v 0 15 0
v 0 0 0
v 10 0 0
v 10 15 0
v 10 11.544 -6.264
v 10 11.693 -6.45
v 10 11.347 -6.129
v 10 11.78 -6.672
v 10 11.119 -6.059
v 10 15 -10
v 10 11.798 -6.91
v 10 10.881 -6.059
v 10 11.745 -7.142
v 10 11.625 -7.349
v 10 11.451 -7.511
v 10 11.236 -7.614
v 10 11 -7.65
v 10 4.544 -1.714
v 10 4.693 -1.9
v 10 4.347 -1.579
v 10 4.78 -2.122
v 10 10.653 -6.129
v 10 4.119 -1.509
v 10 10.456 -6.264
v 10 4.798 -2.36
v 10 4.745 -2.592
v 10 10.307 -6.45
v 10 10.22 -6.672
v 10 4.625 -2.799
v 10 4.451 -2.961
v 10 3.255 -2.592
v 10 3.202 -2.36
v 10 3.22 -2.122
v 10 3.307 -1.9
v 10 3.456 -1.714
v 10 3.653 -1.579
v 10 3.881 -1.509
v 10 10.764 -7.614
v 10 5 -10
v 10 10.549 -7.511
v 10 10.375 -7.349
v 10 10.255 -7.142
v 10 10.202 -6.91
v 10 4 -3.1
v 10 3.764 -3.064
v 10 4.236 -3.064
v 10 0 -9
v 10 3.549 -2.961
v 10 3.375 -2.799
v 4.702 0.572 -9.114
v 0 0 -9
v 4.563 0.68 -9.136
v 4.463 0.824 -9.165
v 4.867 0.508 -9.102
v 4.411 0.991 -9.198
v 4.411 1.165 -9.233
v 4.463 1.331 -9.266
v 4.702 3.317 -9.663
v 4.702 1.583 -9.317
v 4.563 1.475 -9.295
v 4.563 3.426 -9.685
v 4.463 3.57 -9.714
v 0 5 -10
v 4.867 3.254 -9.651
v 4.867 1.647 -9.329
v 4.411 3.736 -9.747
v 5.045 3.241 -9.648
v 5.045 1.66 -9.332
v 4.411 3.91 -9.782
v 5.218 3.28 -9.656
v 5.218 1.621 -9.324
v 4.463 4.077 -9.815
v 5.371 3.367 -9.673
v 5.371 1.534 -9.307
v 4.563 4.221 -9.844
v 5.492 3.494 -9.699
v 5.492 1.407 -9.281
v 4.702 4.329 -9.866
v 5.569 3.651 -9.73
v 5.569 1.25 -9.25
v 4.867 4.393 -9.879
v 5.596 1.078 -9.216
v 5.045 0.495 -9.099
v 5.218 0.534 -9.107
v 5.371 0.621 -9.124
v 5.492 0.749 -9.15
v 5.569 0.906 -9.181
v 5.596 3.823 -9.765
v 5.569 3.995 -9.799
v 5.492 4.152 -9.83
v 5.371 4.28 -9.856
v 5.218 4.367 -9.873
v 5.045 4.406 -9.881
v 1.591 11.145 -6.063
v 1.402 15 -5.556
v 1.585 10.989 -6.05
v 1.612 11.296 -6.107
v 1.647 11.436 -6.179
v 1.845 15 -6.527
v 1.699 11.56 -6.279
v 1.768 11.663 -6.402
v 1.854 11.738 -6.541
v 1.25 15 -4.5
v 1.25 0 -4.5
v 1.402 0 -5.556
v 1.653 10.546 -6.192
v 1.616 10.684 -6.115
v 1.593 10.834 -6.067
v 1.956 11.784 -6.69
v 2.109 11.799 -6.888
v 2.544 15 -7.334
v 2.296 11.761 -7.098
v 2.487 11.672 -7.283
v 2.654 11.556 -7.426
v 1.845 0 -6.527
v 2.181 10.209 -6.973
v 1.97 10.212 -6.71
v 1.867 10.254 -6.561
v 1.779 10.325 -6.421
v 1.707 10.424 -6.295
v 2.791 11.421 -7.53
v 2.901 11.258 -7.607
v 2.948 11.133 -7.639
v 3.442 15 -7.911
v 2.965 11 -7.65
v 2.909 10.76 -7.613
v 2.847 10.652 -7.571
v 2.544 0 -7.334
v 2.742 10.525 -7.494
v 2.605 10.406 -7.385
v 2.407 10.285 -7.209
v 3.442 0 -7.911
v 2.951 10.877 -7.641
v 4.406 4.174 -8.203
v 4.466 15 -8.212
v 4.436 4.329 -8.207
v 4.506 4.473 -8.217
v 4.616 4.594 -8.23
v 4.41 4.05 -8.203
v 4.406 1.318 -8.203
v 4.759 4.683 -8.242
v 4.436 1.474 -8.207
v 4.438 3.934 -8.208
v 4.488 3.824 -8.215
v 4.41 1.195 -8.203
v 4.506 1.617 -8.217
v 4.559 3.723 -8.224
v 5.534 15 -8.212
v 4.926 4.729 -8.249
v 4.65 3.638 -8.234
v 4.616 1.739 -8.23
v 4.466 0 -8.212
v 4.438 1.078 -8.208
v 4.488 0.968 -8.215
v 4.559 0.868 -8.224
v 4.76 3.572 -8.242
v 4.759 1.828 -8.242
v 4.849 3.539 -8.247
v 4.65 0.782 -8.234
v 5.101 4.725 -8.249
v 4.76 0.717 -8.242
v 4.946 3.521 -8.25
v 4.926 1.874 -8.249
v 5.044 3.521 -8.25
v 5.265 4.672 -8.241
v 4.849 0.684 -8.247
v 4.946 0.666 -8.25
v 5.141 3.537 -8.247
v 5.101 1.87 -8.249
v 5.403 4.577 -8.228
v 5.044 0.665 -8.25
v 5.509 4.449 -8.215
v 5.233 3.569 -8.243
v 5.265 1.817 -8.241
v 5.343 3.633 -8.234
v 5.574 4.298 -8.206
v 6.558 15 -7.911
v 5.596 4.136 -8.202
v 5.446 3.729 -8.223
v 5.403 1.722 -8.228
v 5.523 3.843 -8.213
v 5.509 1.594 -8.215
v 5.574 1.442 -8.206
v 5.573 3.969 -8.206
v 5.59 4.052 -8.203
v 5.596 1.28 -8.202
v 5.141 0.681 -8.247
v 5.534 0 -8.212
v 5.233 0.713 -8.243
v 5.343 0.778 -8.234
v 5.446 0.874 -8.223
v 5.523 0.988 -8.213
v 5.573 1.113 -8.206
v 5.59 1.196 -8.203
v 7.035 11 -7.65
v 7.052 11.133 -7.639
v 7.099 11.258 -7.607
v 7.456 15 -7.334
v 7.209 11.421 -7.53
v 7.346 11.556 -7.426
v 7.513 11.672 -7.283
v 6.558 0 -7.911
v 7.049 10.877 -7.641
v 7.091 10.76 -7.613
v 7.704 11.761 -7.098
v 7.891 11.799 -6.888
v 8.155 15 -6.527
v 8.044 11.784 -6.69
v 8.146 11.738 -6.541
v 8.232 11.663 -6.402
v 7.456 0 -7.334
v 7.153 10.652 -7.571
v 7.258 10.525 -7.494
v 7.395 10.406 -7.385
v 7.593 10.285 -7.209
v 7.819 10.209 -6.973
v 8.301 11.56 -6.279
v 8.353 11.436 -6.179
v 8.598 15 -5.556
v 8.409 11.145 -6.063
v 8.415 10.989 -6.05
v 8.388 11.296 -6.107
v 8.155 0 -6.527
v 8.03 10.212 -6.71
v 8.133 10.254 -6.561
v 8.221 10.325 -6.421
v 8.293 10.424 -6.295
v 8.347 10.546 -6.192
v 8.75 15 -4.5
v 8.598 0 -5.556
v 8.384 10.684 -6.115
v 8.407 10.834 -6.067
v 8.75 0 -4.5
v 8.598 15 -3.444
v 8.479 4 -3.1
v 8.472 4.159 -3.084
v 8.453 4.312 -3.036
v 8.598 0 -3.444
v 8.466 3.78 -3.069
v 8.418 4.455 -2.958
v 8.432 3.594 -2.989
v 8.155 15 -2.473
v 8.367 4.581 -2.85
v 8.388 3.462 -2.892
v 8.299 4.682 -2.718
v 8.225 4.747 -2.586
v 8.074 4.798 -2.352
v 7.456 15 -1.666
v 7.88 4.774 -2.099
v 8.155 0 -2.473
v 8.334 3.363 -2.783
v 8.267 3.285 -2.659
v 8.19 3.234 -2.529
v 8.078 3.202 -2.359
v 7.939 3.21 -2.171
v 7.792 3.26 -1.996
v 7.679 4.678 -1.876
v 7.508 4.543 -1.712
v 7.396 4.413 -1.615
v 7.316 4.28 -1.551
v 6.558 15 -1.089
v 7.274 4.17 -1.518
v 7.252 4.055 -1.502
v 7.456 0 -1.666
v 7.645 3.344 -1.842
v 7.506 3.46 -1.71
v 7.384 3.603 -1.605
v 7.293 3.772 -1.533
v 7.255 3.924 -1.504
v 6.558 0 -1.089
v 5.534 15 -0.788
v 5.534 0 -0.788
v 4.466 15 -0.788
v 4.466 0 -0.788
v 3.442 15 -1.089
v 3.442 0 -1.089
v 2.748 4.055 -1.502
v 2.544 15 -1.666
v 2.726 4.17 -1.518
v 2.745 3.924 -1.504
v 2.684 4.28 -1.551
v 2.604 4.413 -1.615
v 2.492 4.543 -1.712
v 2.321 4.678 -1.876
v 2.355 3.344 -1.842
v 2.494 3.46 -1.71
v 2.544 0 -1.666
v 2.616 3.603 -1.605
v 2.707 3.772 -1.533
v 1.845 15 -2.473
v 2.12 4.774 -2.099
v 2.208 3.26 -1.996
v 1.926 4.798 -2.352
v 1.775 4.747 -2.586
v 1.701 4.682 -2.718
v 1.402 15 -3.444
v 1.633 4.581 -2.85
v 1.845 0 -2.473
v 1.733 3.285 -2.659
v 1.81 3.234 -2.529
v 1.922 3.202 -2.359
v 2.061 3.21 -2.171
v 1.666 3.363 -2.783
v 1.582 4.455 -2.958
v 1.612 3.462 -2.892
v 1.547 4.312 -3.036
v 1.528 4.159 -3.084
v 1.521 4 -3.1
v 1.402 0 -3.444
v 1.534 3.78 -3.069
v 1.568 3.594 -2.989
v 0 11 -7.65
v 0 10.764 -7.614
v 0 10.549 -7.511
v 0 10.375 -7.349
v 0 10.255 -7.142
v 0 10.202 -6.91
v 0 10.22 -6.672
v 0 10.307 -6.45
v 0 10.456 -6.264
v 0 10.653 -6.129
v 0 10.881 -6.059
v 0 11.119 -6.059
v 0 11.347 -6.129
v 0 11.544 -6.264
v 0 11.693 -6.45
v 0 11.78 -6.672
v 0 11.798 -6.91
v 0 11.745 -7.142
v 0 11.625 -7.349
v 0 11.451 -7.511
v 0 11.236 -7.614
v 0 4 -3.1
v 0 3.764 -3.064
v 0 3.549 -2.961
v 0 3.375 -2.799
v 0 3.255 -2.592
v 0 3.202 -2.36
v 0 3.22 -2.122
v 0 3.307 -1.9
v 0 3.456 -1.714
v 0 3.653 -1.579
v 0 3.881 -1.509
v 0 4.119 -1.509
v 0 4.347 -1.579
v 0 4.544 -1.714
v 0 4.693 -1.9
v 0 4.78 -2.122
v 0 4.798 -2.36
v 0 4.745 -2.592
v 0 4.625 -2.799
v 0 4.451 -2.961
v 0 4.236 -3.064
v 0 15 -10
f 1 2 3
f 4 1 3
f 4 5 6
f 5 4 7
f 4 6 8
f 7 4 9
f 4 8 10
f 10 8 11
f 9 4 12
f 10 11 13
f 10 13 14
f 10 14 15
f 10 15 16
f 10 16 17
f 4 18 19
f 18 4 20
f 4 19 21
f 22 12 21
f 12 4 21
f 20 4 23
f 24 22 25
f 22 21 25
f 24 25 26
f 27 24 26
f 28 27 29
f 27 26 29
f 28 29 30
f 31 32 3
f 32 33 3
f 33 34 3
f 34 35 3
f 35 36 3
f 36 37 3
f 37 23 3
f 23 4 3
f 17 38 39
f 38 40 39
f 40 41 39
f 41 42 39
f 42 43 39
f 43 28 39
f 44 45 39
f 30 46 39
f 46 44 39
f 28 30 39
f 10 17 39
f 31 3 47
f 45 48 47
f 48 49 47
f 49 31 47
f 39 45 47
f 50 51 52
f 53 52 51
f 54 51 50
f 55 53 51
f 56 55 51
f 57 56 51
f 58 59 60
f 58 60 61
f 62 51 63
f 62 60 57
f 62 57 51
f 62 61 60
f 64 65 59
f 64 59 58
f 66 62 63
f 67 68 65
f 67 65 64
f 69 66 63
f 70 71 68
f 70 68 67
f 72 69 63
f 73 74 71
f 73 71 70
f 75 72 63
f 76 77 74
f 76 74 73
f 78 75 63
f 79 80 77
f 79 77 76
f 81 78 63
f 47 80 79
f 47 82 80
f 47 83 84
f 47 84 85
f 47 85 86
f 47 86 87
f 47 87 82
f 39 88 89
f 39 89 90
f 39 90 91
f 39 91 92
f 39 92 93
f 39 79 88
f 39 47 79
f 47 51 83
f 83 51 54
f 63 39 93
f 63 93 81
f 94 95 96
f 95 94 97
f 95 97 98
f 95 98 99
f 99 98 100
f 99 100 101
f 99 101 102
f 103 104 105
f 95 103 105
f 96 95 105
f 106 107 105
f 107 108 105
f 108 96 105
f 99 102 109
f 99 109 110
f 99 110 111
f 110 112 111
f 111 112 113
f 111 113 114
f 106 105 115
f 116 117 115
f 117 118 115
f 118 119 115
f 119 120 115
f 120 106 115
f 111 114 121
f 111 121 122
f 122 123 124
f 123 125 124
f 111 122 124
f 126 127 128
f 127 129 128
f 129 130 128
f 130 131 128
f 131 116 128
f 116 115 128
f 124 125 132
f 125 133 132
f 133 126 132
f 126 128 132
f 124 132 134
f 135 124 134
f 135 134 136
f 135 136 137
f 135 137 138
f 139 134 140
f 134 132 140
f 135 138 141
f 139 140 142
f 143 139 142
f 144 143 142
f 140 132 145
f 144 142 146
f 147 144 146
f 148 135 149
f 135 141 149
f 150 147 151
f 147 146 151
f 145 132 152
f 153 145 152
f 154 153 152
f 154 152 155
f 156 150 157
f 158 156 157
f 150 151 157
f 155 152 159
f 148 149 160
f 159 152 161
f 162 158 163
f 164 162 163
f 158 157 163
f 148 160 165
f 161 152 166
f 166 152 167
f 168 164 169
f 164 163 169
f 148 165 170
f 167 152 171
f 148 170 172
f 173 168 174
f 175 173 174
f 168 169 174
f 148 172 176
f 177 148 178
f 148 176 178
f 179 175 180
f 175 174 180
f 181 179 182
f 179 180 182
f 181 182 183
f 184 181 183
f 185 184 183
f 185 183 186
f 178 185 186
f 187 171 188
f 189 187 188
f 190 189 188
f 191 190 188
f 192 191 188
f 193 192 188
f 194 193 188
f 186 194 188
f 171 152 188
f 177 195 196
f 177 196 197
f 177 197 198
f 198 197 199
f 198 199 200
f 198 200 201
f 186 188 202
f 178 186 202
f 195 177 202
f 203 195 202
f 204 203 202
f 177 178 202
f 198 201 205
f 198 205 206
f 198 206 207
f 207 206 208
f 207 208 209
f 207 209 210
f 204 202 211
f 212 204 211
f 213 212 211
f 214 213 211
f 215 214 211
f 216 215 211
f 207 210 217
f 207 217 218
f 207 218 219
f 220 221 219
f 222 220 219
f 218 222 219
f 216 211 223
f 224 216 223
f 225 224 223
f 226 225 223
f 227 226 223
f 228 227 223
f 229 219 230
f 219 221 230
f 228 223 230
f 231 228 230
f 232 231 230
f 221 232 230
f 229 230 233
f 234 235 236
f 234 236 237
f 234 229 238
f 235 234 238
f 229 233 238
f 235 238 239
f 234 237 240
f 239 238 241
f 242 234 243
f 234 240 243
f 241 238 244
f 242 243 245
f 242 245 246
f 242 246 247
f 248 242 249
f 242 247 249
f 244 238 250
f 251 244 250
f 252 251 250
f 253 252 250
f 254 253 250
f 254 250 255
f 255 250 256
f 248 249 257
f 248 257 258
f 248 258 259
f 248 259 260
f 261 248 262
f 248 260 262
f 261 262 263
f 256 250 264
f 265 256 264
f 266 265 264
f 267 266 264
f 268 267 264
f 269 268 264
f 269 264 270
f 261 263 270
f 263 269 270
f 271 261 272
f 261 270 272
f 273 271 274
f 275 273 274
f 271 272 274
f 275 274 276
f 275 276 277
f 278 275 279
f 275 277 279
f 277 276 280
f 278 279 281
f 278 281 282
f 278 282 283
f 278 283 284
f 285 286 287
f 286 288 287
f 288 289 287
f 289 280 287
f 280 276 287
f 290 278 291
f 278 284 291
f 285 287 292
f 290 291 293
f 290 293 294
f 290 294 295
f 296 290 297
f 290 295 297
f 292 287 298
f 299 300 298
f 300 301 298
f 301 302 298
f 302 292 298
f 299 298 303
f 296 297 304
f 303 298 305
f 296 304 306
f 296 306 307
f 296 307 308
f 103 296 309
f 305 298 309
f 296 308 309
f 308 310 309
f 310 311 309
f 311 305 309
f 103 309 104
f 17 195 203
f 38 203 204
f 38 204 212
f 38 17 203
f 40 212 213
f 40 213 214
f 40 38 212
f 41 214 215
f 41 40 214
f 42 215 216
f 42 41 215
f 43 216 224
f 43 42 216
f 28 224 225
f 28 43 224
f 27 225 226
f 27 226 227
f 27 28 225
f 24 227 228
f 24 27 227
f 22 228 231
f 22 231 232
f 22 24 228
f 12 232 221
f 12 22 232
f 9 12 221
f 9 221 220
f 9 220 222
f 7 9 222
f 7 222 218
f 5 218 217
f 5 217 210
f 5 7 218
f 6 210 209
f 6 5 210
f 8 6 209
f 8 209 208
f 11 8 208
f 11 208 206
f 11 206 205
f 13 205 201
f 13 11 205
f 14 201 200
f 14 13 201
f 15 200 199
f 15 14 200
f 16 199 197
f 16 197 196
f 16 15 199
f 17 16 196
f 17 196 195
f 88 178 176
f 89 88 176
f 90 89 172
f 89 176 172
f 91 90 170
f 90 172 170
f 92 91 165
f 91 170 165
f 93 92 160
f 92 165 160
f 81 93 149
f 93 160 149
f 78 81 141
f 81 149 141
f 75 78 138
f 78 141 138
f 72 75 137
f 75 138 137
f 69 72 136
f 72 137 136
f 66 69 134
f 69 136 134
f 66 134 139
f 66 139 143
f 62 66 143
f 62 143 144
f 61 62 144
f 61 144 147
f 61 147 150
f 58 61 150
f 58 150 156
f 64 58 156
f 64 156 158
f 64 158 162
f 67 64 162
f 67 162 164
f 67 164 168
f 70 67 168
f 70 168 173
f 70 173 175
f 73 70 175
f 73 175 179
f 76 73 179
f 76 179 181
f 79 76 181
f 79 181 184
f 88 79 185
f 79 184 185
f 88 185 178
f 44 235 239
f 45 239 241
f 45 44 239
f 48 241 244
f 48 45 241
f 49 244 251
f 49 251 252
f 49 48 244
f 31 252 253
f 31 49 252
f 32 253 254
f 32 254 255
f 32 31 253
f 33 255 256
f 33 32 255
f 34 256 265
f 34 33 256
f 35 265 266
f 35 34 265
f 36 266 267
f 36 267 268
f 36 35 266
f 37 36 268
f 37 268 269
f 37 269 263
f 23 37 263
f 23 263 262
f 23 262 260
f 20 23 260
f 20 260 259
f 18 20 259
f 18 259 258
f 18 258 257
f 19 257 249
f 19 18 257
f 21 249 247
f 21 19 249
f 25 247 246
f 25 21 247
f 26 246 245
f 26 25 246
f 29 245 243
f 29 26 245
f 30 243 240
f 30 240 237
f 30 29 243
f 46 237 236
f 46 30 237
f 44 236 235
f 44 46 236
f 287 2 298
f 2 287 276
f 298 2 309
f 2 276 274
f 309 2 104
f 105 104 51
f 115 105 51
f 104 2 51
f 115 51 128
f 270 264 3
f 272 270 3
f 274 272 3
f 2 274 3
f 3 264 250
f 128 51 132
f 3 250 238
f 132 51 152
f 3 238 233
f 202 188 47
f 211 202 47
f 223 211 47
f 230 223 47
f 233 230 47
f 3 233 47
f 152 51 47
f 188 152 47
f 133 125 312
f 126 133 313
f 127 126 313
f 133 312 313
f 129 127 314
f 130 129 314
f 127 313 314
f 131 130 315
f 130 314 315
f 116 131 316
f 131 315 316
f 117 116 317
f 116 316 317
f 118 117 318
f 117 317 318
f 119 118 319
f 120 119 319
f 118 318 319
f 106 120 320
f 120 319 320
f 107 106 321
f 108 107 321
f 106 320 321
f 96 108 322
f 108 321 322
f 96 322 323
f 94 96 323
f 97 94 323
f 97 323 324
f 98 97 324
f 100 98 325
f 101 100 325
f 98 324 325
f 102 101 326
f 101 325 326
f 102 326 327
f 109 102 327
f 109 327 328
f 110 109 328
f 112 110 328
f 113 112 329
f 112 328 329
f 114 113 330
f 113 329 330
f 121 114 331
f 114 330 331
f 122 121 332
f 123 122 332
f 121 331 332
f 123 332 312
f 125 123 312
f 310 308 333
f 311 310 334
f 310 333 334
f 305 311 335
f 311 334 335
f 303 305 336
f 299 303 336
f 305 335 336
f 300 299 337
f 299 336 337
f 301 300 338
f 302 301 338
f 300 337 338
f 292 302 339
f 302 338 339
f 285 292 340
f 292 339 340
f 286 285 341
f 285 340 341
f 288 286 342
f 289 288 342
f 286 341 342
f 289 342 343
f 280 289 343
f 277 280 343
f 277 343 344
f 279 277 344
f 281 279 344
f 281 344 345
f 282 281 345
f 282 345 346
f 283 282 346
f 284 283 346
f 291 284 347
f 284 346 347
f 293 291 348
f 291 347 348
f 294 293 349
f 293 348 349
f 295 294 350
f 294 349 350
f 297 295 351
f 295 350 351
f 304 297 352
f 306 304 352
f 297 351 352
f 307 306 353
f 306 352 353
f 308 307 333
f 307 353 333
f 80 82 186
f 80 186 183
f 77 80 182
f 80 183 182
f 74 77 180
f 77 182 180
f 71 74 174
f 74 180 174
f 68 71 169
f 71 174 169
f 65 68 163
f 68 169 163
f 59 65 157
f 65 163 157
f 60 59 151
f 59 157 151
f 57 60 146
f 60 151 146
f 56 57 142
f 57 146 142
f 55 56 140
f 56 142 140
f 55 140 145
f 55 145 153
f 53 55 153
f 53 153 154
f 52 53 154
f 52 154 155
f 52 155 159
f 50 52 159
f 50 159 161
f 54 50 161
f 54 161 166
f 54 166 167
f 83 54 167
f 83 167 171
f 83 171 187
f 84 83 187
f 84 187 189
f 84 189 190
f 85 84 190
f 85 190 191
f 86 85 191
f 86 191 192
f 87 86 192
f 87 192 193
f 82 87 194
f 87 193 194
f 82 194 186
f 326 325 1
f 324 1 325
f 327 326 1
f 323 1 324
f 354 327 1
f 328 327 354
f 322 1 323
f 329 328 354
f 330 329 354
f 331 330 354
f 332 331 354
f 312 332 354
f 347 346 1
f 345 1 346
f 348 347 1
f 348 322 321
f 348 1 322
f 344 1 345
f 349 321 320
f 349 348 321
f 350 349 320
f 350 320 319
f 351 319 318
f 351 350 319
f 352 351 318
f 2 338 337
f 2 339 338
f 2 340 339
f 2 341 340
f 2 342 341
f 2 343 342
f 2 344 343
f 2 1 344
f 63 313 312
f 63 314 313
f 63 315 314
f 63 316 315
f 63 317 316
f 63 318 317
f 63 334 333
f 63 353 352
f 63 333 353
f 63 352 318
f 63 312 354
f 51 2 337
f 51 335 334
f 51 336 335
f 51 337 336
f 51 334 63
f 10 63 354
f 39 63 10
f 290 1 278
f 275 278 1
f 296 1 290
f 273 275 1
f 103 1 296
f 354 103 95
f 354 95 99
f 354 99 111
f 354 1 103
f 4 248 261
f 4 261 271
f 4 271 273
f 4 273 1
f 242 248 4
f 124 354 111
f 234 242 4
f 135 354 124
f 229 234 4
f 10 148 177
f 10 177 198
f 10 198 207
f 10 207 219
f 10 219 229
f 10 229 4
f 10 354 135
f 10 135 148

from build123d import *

# Parameters (mm, degrees)
SKETCH1_W                      = 10
SKETCH1_H                      = 10
BOSS_EXTRUDE1_DEPTH            = 15
F_97_0_0059_DIAMETER_HOLE1_D   = 7.499999986
CUT_EXTRUDE1_DEPTH             = 15
F_0_80_TAPPED_HOLE1_D          = 1.19126
F_0_80_TAPPED_HOLE1_DEPTH      = 4.95
F_0_80_TAPPED_HOLE1_TIP        = 0.357890611
M2X0_4_TAPPED_HOLE1_AT_2_COUNT = 2
M2X0_4_TAPPED_HOLE1_AT_2_PITCH = 8.348802309


with BuildPart() as part:
    # Sketch1 → Boss-Extrude1 (new body)
    with BuildSketch(Plane(origin=(0, 0, 0), x_dir=(1, 0, 0), z_dir=(0, 1, 0))):
        with Locations((5, 5)):
            Rectangle(SKETCH1_W, SKETCH1_H)
    extrude(amount=BOSS_EXTRUDE1_DEPTH)

    # #97 (0.0059) Diameter Hole1 (through all)
    with Locations(Plane(origin=(0, 15, 0), x_dir=(1, 0, 0), z_dir=(0, 1, 0))):
        with Locations((5, 4.5)):
            Hole(F_97_0_0059_DIAMETER_HOLE1_D / 2)

    # Sketch4 → Cut-Extrude1 (cut)
    with BuildSketch(Plane(origin=(10, 0, 0), x_dir=(0, 0, -1), z_dir=(1, 0, 0))):
        Polygon((10, 0), (9, 0), (10, 5.000000002), align=None)
    extrude(amount=-CUT_EXTRUDE1_DEPTH, mode=Mode.SUBTRACT)

    # #0-80 Tapped Hole1
    with Locations(Plane(origin=(0, -1.73076923, -8.653846154), x_dir=(-1, 0, 0), z_dir=(0, -0.19611613506937778, -0.9805806757046814))):
        with Locations((-5, 5.664064731), (-5, 2.864064731)):
            Hole(F_0_80_TAPPED_HOLE1_D / 2, depth=F_0_80_TAPPED_HOLE1_DEPTH)
            with Locations((0, 0, -(F_0_80_TAPPED_HOLE1_DEPTH + F_0_80_TAPPED_HOLE1_TIP / 2))):  # 118° drill point
                Cone(0, F_0_80_TAPPED_HOLE1_D / 2, F_0_80_TAPPED_HOLE1_TIP, mode=Mode.SUBTRACT)

    # Sketch7 → M2x0.4 Tapped Hole1 (revolve, cut)
    with BuildSketch(Plane(origin=(10, 4, -2.3), x_dir=(0, 0, -1), z_dir=(0, 1, 0))):
        Polygon((0, 0), (0, 5.680688495), (0.8, 5.2), (0.8, 0), align=None)
    m2x0_4_tapped_hole1 = revolve(axis=Axis((16.35, 4, -2.3), (-1, 0, 0)), mode=Mode.SUBTRACT)

    # M2x0.4 Tapped Hole1 at 2: M2x0.4 Tapped Hole1 ×2
    with Locations(*[Vector(0, 0.838443616300637, -0.5449883505954144) * (i * M2X0_4_TAPPED_HOLE1_AT_2_PITCH) for i in range(1, M2X0_4_TAPPED_HOLE1_AT_2_COUNT)]):
        add(m2x0_4_tapped_hole1, mode=Mode.SUBTRACT)

    # Mirror1: M2x0.4 Tapped Hole1 across plane
    add(m2x0_4_tapped_hole1.mirror(Plane(origin=(5, 0, 0), x_dir=(0, 0, 1), z_dir=(1, 0, 0))), mode=Mode.SUBTRACT)

    # Mirror1 copy 1 sketch → Mirror1 copy 1 (revolve, cut)
    with BuildSketch(Plane(origin=(0, 11, -6.85), x_dir=(0, 0, -1), z_dir=(0, 1, 0))):
        Polygon((0, 0), (0, -5.680688495), (0.8, -5.2), (0.8, 0), align=None)
    revolve(axis=Axis((-6.35, 11, -6.85), (-1, 0, 0)), mode=Mode.SUBTRACT)


solid = part.part
